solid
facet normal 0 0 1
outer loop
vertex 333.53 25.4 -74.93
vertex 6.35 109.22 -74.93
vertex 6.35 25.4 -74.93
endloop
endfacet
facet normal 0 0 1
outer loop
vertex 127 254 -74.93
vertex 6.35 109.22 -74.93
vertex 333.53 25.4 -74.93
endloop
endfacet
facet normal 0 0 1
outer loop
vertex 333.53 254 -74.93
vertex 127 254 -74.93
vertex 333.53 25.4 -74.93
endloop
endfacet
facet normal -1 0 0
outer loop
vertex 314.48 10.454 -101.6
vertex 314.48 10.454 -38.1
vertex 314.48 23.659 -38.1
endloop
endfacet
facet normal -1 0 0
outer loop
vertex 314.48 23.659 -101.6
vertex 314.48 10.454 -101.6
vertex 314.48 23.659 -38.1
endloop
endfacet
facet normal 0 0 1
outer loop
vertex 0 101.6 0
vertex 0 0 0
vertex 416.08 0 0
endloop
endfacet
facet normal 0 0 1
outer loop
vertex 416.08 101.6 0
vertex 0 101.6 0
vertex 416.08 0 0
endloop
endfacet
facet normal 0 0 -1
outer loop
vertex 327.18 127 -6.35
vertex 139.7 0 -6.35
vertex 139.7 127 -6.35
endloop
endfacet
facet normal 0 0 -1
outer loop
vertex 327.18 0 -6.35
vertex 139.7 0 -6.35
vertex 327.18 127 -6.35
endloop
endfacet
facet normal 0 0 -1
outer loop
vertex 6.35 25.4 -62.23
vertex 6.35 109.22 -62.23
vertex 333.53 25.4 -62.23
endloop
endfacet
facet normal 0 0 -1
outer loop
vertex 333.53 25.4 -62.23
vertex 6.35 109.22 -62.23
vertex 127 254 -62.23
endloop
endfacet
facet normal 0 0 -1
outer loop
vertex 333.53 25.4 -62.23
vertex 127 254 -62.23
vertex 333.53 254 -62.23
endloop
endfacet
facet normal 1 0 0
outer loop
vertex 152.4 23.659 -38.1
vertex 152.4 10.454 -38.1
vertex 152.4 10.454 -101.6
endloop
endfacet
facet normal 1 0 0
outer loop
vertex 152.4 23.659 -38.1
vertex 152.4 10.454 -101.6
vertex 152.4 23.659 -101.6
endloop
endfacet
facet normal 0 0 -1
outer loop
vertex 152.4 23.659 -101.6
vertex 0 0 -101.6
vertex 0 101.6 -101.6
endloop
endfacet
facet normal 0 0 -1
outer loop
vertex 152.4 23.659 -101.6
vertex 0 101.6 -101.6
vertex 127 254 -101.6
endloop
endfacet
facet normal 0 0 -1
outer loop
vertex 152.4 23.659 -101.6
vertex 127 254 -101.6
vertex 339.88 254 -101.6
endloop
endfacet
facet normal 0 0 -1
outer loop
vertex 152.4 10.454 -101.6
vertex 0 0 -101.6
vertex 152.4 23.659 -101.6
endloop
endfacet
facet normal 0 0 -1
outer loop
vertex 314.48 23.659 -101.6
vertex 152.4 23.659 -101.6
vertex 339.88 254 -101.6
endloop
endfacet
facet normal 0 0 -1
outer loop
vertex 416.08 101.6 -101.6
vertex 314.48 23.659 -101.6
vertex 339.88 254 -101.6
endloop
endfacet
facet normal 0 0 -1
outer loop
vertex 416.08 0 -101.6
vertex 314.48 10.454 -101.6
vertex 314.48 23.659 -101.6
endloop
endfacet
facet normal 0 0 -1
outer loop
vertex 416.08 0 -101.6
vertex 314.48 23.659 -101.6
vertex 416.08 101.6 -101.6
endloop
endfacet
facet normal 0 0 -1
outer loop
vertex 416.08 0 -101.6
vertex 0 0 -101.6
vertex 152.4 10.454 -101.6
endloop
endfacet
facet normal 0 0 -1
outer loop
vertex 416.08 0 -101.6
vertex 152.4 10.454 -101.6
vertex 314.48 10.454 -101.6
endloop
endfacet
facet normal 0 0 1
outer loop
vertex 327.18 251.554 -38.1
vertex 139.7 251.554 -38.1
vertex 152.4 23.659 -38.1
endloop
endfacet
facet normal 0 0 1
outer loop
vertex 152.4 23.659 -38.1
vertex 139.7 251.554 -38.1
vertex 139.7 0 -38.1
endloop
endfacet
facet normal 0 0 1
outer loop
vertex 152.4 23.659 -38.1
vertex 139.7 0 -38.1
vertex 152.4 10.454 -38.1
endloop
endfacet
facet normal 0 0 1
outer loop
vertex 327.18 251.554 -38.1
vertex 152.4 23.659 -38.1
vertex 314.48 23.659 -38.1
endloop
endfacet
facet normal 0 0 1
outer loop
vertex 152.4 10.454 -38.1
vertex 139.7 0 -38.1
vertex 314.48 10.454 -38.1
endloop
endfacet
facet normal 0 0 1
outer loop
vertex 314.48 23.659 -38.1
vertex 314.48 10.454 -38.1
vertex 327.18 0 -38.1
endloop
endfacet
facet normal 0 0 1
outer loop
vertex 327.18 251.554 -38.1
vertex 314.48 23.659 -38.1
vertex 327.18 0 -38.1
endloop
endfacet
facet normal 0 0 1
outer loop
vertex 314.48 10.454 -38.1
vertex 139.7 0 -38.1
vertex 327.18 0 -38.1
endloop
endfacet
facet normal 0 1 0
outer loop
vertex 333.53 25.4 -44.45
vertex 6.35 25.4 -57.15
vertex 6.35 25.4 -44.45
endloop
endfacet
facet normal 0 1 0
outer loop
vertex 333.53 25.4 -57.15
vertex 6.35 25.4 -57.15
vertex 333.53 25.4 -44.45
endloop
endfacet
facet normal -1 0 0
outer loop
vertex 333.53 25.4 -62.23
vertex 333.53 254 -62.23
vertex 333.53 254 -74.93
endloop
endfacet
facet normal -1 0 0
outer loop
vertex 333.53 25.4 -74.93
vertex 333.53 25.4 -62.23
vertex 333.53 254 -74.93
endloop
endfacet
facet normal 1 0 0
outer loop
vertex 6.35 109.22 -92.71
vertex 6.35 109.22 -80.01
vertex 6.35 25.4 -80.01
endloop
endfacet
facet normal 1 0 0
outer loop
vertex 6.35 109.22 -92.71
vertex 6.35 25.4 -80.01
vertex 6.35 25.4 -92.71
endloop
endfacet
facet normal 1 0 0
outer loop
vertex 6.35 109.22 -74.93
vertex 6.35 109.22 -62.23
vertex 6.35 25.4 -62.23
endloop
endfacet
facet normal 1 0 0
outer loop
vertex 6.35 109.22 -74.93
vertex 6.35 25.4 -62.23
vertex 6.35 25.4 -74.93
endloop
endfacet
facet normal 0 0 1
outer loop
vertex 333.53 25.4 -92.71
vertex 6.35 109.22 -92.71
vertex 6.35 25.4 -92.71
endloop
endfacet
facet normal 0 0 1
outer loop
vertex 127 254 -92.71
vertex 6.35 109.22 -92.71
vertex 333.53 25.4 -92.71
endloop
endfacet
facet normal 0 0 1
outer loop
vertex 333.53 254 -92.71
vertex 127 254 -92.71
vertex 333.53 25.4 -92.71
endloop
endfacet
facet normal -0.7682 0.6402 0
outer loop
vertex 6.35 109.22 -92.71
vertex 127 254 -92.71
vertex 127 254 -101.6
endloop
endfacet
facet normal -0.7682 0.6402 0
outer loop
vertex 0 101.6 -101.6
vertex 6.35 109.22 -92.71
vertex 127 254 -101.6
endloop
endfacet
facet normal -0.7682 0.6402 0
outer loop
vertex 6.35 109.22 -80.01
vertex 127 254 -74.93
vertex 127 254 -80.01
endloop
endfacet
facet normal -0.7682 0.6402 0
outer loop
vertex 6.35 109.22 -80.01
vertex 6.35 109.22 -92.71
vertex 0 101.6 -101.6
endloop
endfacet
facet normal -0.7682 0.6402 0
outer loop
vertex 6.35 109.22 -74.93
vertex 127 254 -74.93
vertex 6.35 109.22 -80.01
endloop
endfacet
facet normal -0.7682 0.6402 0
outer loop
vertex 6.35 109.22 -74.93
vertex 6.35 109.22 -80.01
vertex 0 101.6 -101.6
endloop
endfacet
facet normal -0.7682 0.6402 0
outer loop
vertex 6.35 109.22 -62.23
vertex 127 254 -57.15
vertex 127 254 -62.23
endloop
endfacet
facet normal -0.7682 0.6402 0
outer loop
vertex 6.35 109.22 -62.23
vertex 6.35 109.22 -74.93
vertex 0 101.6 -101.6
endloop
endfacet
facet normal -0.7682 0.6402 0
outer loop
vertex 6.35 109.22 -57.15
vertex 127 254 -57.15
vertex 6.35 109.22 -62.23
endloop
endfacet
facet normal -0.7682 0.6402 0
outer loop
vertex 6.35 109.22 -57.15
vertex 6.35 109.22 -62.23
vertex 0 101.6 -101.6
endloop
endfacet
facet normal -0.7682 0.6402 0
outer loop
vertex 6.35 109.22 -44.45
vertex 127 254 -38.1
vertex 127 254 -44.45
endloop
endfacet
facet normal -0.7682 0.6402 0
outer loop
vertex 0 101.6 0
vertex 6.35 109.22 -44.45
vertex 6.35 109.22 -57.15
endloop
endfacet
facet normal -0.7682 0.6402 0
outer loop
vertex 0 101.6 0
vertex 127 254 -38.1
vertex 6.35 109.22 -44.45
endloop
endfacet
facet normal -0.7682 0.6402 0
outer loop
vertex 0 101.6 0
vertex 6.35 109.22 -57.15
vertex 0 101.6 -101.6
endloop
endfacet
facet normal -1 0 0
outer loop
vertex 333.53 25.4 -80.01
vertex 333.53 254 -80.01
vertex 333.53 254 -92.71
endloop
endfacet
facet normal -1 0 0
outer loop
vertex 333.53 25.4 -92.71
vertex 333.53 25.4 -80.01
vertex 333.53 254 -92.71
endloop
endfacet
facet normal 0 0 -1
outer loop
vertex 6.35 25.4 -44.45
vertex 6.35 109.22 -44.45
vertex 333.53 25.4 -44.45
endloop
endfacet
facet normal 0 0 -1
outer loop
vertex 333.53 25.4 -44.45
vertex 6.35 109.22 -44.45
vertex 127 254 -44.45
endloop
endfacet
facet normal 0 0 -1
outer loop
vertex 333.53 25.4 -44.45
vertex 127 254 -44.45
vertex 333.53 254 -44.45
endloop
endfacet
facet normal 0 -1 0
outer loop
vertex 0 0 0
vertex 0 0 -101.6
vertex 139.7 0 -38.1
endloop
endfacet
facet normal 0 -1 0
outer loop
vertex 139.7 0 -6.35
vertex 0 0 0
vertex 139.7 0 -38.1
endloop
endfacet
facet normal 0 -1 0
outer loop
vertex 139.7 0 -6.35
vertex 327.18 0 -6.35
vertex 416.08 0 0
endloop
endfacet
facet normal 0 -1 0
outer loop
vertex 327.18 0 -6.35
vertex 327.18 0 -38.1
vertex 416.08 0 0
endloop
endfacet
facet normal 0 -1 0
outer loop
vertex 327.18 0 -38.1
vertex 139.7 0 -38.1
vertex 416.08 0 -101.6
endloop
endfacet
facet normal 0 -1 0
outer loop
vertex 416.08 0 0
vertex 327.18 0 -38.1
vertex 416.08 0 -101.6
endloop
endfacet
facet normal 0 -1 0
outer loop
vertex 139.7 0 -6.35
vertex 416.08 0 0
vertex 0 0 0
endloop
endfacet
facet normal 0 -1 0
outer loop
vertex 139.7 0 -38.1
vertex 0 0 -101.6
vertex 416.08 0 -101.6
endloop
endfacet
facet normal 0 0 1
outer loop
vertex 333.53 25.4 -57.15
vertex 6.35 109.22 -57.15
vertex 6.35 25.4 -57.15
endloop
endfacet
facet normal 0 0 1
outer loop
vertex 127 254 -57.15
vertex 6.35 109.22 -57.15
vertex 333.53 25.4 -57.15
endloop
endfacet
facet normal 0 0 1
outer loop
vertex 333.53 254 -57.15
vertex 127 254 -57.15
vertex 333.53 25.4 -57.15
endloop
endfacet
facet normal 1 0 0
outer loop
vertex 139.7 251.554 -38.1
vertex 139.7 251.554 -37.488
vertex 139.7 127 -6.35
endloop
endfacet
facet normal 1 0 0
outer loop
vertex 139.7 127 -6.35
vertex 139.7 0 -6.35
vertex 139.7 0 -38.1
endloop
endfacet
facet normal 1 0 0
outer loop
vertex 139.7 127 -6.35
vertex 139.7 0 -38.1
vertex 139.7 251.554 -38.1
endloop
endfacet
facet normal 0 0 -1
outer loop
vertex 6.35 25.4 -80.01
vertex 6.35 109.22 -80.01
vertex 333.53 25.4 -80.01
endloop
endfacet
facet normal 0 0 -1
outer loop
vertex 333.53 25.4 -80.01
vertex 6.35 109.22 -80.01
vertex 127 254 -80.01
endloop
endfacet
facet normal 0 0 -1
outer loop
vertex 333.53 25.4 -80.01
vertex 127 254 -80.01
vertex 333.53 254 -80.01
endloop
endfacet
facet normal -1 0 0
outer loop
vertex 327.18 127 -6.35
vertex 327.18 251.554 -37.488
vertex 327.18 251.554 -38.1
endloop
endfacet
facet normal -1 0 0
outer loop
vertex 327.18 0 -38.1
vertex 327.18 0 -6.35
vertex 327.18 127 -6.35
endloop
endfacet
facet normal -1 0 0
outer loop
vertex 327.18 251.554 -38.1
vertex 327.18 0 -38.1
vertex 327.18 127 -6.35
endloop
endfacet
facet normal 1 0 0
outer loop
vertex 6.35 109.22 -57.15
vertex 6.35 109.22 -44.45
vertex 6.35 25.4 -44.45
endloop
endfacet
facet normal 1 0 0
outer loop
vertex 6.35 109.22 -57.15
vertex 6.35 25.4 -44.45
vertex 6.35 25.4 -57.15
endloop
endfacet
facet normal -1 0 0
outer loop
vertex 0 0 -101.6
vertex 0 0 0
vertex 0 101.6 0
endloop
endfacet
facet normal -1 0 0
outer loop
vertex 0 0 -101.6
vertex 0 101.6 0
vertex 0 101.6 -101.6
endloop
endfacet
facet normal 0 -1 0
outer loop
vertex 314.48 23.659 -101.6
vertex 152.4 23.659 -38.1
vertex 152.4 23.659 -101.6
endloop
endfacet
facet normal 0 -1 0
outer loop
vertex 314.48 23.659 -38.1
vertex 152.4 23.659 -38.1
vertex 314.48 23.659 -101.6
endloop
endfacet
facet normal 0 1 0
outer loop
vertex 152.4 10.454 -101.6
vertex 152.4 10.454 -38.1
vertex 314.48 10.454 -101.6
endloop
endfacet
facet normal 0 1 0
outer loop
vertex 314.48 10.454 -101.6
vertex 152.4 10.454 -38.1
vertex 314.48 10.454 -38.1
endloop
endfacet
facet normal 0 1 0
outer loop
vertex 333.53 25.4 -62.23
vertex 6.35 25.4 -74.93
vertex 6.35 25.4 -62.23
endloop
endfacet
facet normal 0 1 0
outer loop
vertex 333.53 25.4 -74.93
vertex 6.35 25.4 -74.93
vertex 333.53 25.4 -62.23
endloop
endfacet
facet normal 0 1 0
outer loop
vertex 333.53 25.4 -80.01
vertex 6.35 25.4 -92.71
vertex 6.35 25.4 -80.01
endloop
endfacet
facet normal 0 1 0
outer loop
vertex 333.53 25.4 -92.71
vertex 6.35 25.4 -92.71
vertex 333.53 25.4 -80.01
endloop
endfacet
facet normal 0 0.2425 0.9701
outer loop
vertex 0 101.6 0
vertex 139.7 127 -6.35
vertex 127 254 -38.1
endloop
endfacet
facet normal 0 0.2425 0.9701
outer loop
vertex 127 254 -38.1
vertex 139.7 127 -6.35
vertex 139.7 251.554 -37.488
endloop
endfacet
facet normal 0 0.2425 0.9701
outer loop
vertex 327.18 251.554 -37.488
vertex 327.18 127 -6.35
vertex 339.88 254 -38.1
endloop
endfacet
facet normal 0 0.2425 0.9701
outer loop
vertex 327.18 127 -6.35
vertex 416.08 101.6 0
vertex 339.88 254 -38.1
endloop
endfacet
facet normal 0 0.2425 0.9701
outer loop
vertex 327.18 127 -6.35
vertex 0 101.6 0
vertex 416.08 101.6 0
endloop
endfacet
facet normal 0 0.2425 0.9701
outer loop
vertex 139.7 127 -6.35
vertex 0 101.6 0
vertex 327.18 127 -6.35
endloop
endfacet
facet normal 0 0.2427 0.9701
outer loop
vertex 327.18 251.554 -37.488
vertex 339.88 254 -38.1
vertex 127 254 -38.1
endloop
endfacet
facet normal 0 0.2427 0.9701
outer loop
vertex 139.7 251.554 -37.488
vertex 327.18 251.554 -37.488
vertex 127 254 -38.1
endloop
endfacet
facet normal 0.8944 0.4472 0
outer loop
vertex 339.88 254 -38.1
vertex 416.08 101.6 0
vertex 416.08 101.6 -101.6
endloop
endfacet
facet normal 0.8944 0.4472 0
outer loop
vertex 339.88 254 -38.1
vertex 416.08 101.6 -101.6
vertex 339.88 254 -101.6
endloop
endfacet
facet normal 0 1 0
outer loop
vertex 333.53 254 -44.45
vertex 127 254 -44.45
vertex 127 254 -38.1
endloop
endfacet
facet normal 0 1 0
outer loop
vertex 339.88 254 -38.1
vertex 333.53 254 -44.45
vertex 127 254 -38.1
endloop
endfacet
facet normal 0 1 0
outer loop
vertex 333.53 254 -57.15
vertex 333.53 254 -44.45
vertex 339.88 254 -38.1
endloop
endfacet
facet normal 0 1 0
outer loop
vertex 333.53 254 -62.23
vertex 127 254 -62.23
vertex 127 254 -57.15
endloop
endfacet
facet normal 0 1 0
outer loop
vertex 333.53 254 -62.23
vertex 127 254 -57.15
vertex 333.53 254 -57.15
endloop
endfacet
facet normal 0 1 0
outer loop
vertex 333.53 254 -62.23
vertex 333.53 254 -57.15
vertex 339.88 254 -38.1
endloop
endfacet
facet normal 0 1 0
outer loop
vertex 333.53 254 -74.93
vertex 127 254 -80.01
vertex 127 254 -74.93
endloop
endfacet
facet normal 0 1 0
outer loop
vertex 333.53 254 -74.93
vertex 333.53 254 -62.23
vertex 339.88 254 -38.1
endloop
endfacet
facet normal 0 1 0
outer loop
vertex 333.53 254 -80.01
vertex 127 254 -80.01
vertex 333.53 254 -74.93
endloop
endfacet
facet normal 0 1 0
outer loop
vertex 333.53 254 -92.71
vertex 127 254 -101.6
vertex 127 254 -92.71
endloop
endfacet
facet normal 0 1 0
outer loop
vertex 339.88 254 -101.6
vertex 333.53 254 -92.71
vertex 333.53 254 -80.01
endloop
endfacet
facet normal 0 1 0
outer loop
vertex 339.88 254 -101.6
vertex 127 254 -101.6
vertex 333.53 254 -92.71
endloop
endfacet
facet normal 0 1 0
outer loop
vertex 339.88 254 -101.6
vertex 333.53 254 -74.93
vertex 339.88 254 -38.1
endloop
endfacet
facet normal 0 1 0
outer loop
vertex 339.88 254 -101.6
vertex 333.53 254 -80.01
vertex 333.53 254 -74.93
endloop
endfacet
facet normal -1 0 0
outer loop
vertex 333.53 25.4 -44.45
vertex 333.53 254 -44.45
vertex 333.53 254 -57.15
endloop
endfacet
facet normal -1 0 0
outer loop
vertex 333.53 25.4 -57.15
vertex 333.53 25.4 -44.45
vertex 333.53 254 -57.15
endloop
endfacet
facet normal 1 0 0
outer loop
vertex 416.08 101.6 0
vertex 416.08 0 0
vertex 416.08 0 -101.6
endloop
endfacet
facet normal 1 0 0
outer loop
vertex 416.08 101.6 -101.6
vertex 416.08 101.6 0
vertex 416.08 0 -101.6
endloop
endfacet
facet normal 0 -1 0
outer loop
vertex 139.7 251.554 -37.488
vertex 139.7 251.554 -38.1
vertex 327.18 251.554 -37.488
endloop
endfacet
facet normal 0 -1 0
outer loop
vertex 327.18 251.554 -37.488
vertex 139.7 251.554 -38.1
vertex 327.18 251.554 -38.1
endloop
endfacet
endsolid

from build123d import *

# Parameters (mm, degrees)
SKETCH1_W           = 416.08
SKETCH1_H           = 101.6
BOSS_EXTRUDE2_DEPTH = 254
CUT_EXTRUDE1_DEPTH  = 101.6
SKETCH6_W           = 187.48
SKETCH6_H           = 31.75
CUT_EXTRUDE9_DEPTH  = 251.554
SKETCH8_W           = 327.18
SKETCH8_H           = 12.7
CUT_EXTRUDE11_DEPTH = 228.6
CUT_EXTRUDE12_DEPTH = 498.956952356
CUT_EXTRUDE13_REACH = 493.6
SKETCH10_W          = 162.08
SKETCH10_H          = 13.204649201


with BuildPart() as part:
    # Sketch1 → Boss-Extrude2 (new body)
    with BuildSketch(Plane(origin=(0, 0, 0), x_dir=(1, 0, 0), z_dir=(0, 1, 0))):
        with Locations((208.04, 50.8)):
            Rectangle(SKETCH1_W, SKETCH1_H)
    extrude(amount=BOSS_EXTRUDE2_DEPTH)

    # Sketch2 → Cut-Extrude1 (cut)
    with BuildSketch(Plane.XY):
        Polygon((0, 101.6), (0, 254), (127, 254), align=None)
        Polygon((416.08, 254), (416.08, 101.6), (339.88, 254), align=None)
    extrude(amount=-CUT_EXTRUDE1_DEPTH, mode=Mode.SUBTRACT)

    # Sketch6 → Cut-Extrude9 (cut)
    with BuildSketch(Plane(origin=(0, 0, 0), x_dir=(1, 0, 0), z_dir=(0, 1, 0))):
        with Locations((233.44, 22.225)):
            Rectangle(SKETCH6_W, SKETCH6_H)
    extrude(amount=CUT_EXTRUDE9_DEPTH, mode=Mode.SUBTRACT)

    # Sketch8 → Cut-Extrude11 (cut)
    with BuildSketch(Plane(origin=(0, 254, 0), x_dir=(1, 0, 0), z_dir=(0, 1, 0))):
        with Locations((169.94, 50.8)):
            Rectangle(SKETCH8_W, SKETCH8_H)
        with Locations((169.94, 68.58)):
            Rectangle(SKETCH8_W, SKETCH8_H)
        with Locations((169.94, 86.36)):
            Rectangle(SKETCH8_W, SKETCH8_H)
    extrude(amount=-CUT_EXTRUDE11_DEPTH, mode=Mode.SUBTRACT)

    # Sketch9 → Cut-Extrude12 (cut, through all)
    with BuildSketch(Plane(origin=(416.08, 0, 0), x_dir=(0, 0, -1), z_dir=(1, 0, 0))):
        Polygon((0, 254), (0, 101.6), (38.1, 254), align=None)
    extrude(amount=-CUT_EXTRUDE12_DEPTH, mode=Mode.SUBTRACT)

    # Sketch10 → Cut-Extrude13 (cut, up to next)
    with BuildSketch(Plane.XY.offset(-38.1), mode=Mode.PRIVATE) as cut_extrude13_sk1:
        with Locations((233.44, 17.056383054)):
            Rectangle(SKETCH10_W, SKETCH10_H)
    cut_extrude13_tool1 = extrude(cut_extrude13_sk1.sketch, amount=-CUT_EXTRUDE13_REACH, mode=Mode.PRIVATE) & part.part
    add(cut_extrude13_tool1.solids().sort_by_distance((233.44, 17.056383, -38.1))[0], mode=Mode.SUBTRACT)


solid = part.part
